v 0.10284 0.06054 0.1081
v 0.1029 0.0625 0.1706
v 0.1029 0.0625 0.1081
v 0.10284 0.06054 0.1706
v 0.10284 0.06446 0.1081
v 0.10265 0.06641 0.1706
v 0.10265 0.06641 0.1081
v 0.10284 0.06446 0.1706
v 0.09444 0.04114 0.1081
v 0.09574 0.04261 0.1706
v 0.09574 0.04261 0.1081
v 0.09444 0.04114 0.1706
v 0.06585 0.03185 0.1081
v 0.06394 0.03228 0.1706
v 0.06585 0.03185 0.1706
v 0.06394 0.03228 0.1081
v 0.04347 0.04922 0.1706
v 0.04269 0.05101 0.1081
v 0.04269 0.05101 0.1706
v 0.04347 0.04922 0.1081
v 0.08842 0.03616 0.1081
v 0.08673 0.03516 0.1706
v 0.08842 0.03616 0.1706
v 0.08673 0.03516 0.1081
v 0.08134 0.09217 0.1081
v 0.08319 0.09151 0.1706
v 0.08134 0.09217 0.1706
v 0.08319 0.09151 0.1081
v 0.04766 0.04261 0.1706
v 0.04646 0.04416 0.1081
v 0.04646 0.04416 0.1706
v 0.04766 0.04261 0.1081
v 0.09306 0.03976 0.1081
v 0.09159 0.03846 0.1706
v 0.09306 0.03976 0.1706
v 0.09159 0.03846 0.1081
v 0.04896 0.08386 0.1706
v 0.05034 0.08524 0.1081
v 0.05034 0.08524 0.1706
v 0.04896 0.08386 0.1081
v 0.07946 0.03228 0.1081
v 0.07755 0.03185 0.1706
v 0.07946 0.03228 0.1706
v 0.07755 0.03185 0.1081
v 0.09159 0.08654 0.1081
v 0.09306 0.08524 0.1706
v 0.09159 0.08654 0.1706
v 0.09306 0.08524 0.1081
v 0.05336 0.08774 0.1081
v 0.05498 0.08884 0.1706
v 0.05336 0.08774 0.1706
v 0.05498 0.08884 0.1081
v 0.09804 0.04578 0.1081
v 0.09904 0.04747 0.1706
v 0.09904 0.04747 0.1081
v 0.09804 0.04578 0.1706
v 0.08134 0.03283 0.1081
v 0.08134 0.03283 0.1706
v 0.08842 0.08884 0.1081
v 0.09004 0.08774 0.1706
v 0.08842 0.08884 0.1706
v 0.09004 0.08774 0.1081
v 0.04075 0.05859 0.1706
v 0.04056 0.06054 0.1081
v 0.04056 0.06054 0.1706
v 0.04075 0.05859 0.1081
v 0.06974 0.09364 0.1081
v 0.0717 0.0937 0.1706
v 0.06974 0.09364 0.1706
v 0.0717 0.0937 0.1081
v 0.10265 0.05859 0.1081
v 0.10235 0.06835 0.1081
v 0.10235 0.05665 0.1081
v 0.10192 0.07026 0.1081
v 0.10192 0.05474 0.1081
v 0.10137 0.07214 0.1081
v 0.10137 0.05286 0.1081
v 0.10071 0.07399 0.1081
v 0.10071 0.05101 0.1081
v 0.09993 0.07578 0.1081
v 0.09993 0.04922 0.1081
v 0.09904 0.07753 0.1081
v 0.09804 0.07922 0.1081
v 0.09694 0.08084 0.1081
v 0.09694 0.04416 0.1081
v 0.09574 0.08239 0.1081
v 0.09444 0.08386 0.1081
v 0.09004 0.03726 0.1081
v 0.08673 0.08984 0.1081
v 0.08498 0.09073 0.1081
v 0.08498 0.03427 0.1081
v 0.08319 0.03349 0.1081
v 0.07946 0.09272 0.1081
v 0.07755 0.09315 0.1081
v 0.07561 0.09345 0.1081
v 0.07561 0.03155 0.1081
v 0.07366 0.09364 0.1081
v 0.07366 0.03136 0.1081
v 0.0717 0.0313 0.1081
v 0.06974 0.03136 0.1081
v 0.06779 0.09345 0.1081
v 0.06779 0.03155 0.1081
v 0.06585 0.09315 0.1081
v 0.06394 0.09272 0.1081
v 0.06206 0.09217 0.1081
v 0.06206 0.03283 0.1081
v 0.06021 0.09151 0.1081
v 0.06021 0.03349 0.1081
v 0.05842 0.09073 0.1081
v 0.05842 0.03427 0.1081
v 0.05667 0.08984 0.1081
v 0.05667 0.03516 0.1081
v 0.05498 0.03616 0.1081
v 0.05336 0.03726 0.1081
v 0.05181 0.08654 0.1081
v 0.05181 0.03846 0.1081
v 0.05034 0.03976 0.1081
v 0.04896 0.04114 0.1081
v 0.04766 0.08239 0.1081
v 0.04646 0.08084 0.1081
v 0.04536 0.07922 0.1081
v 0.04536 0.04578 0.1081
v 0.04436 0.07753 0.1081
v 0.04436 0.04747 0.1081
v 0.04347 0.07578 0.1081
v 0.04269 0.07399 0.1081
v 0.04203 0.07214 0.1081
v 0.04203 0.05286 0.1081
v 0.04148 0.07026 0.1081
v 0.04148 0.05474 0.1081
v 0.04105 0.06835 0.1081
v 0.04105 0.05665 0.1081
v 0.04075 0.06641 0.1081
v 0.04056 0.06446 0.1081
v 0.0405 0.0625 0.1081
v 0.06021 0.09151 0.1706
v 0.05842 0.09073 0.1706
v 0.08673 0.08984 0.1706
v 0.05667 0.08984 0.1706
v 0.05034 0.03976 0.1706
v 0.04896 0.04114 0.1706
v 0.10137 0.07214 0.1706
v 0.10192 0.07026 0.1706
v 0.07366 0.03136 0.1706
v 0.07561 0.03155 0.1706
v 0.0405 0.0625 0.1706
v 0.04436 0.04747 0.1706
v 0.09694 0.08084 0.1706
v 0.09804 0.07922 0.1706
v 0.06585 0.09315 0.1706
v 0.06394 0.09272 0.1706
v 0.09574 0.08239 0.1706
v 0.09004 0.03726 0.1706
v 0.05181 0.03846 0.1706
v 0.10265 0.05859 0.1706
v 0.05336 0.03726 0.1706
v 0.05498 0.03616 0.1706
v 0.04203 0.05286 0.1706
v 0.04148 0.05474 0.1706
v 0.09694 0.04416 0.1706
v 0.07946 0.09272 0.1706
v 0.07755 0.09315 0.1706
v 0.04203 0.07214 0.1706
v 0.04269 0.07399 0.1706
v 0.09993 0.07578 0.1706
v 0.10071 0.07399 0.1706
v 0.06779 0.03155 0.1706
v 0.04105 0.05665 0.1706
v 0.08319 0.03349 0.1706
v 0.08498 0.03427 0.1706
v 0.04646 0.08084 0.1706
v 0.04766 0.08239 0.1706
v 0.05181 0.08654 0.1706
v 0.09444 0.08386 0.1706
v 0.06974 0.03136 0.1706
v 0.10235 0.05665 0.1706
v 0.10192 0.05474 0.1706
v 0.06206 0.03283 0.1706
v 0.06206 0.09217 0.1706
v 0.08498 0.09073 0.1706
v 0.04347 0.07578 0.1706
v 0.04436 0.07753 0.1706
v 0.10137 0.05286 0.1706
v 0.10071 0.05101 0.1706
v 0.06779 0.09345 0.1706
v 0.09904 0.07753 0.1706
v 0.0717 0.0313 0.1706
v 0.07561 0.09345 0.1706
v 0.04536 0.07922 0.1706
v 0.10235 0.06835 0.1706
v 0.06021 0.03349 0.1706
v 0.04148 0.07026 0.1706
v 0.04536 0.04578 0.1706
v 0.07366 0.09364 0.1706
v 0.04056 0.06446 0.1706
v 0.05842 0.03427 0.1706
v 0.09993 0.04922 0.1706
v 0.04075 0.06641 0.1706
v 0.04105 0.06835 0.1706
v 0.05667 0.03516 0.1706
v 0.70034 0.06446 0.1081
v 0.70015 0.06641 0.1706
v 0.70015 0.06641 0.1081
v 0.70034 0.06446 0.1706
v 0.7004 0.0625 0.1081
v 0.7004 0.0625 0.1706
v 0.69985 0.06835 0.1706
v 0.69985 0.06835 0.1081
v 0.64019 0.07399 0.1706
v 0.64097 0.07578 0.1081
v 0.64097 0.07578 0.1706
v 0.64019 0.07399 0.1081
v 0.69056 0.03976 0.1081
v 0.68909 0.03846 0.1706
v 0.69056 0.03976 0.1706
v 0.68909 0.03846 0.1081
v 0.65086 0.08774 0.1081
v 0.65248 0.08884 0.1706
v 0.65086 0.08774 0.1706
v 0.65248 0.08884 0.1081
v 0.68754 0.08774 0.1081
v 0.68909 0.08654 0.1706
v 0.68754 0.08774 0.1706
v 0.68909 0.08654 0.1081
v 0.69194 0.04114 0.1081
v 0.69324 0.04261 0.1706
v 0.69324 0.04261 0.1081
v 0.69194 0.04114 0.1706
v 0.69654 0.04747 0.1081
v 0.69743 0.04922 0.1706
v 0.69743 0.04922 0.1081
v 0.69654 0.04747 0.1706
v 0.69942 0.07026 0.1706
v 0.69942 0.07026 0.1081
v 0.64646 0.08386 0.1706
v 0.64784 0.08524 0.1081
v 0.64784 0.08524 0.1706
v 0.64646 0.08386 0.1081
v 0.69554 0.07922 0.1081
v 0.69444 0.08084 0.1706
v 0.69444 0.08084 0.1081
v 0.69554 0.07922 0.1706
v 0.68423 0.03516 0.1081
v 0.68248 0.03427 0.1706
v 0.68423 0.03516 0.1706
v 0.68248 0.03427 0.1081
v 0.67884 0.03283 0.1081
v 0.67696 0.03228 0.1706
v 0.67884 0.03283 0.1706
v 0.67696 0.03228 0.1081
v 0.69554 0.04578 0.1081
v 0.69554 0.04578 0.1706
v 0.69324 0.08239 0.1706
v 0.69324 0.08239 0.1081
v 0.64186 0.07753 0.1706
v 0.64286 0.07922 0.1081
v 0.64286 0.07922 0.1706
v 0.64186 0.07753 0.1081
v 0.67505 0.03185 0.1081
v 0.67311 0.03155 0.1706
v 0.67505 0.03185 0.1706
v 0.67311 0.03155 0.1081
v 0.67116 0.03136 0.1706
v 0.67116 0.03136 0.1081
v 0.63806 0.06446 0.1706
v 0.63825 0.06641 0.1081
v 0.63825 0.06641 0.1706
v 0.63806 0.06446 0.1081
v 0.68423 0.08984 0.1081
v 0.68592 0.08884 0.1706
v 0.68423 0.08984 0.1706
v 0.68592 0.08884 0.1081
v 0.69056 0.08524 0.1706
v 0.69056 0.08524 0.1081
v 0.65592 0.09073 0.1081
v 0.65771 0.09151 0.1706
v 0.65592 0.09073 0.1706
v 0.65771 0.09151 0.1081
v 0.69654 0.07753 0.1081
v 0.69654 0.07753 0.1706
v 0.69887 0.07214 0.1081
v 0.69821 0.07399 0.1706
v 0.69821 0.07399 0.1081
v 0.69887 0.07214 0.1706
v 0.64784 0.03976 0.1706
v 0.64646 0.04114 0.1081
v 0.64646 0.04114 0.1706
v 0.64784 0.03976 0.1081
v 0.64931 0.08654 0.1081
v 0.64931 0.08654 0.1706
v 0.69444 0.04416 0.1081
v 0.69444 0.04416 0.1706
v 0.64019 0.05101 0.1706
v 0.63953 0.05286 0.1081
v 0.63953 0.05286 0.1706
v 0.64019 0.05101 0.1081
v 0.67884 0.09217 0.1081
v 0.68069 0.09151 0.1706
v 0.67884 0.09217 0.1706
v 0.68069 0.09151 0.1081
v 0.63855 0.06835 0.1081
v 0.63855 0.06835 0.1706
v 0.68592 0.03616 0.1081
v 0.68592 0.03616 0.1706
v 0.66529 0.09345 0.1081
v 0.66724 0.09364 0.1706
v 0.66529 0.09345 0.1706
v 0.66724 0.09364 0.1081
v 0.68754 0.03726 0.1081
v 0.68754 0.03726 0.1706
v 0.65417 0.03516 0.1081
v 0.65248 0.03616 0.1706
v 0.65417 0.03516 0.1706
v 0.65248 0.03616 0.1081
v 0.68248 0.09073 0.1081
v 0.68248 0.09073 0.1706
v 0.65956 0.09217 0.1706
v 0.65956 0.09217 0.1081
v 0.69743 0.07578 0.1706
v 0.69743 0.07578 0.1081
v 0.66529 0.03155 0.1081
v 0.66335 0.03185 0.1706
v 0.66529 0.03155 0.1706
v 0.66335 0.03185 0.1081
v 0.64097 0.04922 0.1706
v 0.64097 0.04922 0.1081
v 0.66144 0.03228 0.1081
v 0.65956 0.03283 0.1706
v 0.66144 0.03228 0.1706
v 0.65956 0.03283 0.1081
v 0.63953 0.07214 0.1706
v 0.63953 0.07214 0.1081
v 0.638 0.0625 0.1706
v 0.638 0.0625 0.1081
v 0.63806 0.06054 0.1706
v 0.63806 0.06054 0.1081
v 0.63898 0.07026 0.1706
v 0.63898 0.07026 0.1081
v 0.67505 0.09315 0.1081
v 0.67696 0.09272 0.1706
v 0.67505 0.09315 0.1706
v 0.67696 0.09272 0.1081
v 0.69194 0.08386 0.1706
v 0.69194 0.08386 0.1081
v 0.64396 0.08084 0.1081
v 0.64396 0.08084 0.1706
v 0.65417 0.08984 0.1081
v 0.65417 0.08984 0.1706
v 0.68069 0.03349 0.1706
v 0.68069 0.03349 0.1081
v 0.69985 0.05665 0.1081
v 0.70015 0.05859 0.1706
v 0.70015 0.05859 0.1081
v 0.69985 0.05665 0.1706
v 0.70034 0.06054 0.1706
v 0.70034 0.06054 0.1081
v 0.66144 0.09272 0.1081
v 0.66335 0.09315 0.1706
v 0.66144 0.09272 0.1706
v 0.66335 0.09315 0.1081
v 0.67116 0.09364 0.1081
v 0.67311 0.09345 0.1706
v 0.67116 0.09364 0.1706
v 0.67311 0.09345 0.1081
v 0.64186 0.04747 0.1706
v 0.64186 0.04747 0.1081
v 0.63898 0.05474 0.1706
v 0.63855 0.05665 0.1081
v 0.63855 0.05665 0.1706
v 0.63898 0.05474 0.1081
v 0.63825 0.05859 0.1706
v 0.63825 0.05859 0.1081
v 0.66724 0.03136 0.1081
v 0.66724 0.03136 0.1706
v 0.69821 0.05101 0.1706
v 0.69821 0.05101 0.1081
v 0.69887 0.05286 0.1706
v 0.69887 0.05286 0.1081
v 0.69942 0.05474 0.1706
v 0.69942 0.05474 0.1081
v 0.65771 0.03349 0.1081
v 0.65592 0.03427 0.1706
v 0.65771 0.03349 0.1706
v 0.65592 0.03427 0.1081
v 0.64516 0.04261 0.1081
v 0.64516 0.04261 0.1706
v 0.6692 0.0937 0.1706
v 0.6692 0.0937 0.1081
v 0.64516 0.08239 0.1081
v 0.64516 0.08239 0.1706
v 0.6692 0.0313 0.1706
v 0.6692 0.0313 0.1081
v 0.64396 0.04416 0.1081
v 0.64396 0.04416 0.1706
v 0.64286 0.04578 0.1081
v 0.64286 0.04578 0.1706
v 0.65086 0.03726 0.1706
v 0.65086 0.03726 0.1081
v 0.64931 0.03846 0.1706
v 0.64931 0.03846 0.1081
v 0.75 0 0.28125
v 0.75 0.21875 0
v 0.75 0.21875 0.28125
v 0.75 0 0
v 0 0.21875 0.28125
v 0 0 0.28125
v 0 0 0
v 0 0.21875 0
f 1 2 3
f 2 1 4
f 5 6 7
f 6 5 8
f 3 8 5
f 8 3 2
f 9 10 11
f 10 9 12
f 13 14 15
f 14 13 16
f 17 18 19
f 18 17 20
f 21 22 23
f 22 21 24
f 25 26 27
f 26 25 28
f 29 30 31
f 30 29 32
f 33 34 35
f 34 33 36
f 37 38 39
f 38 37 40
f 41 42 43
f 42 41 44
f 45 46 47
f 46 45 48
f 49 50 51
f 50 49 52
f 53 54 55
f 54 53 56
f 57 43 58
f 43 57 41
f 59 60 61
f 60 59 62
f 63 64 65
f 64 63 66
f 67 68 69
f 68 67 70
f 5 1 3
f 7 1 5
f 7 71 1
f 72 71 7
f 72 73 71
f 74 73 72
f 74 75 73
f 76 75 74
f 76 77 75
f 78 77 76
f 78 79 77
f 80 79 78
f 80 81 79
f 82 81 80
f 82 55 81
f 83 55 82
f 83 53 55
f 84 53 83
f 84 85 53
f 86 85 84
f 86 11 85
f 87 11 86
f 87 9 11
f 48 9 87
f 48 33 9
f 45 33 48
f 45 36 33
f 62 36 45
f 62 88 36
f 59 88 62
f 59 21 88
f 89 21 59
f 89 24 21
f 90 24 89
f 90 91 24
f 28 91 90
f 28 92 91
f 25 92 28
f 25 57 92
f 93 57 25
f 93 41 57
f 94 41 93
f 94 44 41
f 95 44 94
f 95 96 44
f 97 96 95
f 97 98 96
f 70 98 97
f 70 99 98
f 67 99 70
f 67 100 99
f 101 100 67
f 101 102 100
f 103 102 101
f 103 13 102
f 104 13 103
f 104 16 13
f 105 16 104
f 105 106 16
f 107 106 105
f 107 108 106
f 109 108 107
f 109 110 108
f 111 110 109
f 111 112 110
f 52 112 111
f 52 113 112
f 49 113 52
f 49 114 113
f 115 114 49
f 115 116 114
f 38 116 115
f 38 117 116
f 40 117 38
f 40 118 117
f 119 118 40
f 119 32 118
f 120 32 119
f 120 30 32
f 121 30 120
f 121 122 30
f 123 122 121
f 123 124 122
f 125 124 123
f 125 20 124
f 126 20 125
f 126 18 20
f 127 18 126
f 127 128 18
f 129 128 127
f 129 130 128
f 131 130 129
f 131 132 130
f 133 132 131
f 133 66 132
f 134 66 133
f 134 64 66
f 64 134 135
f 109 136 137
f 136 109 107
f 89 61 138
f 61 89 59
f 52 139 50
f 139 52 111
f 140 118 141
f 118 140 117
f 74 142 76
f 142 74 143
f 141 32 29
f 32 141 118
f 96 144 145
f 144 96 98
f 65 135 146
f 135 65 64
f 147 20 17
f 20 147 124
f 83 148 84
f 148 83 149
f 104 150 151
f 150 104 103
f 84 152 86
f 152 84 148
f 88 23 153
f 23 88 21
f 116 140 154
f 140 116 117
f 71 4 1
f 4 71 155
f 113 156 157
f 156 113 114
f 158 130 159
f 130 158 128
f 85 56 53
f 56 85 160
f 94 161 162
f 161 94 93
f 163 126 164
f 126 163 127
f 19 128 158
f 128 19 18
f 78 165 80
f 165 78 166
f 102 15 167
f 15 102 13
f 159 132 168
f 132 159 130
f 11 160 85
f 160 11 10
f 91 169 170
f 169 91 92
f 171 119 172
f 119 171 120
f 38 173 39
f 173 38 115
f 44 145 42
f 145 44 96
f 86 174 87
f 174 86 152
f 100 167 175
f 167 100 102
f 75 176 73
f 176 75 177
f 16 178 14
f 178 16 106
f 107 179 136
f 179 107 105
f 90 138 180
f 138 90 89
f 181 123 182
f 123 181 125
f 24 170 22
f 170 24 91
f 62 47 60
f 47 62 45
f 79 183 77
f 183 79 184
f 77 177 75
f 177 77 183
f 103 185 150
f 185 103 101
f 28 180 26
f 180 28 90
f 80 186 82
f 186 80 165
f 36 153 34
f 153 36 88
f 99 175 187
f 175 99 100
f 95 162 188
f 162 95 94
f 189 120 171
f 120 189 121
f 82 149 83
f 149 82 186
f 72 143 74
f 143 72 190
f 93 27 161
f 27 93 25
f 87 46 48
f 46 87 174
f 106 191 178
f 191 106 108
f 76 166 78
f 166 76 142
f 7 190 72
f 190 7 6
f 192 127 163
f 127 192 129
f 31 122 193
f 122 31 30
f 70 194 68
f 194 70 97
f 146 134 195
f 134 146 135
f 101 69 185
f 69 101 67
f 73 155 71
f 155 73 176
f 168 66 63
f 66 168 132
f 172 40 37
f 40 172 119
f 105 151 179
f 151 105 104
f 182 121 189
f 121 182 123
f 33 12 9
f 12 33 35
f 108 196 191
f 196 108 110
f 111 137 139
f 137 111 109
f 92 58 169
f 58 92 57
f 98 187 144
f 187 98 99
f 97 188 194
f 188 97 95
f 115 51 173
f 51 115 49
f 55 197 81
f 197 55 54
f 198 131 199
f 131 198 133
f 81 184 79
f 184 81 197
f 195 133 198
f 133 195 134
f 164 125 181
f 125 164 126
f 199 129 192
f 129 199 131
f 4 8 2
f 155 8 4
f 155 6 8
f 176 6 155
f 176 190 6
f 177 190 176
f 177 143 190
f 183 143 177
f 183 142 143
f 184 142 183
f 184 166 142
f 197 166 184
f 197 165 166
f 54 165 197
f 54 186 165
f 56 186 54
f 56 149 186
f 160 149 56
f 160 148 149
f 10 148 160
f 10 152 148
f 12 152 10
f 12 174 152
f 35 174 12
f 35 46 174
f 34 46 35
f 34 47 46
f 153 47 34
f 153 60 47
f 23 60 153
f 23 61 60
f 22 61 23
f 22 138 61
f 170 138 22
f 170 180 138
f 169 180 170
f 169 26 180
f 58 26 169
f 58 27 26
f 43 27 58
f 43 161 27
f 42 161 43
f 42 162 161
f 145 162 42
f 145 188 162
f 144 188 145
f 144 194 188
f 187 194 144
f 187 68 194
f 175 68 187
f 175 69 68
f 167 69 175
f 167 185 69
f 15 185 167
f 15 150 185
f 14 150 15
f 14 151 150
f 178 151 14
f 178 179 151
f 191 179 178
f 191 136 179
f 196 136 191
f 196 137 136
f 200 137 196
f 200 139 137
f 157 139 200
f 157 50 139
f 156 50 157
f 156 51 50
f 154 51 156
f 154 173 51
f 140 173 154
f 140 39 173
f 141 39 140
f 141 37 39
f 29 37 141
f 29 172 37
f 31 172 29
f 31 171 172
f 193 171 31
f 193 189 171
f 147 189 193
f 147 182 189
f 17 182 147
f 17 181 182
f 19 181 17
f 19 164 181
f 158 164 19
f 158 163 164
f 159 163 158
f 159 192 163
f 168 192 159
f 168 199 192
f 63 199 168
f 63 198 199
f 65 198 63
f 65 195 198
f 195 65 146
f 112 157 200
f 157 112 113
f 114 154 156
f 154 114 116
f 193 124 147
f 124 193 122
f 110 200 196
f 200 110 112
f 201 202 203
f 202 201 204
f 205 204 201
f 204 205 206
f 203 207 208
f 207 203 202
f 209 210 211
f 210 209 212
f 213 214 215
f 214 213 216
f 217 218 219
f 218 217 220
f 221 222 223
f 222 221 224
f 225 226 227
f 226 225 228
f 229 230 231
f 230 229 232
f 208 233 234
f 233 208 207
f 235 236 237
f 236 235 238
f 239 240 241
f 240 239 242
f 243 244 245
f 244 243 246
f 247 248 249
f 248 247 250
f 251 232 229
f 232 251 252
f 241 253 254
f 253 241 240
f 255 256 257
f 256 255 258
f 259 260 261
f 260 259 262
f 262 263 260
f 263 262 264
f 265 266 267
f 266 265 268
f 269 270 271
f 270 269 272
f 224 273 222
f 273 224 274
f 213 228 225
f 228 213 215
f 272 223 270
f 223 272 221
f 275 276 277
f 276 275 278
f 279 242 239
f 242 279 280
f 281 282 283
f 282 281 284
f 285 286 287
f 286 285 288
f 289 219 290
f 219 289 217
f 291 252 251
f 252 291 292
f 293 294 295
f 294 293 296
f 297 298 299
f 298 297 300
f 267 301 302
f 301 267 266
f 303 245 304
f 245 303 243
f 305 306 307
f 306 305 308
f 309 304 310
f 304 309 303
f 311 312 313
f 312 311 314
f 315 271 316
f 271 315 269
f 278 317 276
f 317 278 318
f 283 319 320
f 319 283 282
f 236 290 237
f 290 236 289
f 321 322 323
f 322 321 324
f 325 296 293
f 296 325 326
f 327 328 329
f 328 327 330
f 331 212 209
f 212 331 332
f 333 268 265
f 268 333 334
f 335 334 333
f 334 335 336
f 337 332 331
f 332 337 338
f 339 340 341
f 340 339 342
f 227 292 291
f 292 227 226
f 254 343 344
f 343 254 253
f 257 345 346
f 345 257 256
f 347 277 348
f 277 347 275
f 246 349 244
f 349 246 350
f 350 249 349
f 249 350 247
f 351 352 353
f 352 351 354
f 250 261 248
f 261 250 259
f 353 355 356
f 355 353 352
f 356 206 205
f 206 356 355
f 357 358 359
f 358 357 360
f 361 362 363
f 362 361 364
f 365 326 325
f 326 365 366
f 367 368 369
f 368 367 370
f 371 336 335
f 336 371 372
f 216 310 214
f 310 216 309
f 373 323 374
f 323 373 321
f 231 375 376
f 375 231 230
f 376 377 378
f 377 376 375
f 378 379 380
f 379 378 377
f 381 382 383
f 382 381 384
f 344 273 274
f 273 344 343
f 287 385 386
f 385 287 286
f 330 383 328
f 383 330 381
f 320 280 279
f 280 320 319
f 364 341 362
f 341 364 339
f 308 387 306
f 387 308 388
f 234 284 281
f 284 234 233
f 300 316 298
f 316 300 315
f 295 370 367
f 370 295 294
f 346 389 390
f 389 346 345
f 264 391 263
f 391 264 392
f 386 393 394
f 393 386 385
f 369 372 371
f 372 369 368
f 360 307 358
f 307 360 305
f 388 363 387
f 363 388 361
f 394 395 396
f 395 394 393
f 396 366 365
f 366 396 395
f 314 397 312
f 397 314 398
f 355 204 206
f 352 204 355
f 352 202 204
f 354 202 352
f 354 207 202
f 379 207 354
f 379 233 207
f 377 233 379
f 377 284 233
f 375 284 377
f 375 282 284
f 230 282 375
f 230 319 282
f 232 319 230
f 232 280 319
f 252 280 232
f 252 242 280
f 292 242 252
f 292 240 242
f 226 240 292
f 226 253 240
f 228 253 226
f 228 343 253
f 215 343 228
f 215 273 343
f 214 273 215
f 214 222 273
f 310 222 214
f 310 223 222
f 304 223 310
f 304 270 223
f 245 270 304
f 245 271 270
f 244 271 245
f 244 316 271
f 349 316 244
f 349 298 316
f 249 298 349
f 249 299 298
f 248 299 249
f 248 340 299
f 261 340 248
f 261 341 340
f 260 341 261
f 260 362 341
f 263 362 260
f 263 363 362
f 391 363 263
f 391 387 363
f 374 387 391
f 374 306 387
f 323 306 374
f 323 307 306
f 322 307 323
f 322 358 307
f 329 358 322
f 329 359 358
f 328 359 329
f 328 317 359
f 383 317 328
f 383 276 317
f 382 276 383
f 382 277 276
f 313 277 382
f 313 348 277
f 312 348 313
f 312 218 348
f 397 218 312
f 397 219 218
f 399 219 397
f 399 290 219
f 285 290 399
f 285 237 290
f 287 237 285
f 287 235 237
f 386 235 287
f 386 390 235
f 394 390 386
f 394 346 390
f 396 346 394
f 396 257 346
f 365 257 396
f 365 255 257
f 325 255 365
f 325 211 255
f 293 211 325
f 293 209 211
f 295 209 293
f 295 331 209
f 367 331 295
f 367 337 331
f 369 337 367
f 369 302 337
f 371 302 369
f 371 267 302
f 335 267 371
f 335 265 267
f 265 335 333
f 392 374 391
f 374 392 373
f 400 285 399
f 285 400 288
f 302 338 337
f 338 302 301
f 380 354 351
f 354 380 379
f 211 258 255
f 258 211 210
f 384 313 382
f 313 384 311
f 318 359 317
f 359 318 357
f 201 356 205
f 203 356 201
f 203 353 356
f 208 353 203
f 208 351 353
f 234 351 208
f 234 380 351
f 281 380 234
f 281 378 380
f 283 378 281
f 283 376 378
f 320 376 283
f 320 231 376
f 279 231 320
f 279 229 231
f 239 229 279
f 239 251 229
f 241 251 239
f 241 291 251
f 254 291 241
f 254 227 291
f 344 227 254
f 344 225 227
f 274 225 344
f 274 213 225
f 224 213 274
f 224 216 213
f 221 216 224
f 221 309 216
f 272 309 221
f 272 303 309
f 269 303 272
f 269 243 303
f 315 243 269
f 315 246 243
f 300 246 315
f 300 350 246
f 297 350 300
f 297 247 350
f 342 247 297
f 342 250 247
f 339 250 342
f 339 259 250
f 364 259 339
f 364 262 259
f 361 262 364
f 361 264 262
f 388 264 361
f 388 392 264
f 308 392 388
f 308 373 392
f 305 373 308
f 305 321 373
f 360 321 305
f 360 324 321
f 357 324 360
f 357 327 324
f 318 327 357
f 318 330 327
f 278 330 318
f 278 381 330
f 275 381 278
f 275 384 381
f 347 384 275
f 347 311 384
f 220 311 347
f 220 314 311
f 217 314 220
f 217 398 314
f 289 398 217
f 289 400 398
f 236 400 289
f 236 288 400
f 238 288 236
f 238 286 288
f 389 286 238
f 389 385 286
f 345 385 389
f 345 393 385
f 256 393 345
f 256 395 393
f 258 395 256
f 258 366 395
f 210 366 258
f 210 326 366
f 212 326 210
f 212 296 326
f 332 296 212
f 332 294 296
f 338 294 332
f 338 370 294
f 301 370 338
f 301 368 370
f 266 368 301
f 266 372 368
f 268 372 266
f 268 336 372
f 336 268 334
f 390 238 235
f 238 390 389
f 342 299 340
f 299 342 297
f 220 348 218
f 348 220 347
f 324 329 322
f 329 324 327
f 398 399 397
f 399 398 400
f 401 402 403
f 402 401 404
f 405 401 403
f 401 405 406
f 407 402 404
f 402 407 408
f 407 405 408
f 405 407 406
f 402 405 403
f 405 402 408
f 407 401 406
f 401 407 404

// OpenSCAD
// Parameters
length = 0.75;
width = 0.21875;
height = 0.28125;
extrusion_depth = 0.2812;

// Circular cutout parameters
circle_radius = 0.0312;
left_circle_x = 0.0717;
right_circle_x = 0.6692;
circle_y = 0.0625;

// Cut band parameters
cut_band_bottom = 0.1081;
cut_band_top = 0.1705;
cut_depth = 0.0625;

// Resolution
$fn = 100;

// Main base block
module base_block() {
    cube([length, width, height]);
}

// Circular cutout feature
module circular_cutouts() {
    // Left circular cutout
    translate([left_circle_x, circle_y, cut_band_bottom])
        cylinder(h = cut_depth, r = circle_radius, center = false);
    
    // Right circular cutout
    translate([right_circle_x, circle_y, cut_band_bottom])
        cylinder(h = cut_depth, r = circle_radius, center = false);
}

// Final model with cutouts removed from base
difference() {
    base_block();
    circular_cutouts();
}
